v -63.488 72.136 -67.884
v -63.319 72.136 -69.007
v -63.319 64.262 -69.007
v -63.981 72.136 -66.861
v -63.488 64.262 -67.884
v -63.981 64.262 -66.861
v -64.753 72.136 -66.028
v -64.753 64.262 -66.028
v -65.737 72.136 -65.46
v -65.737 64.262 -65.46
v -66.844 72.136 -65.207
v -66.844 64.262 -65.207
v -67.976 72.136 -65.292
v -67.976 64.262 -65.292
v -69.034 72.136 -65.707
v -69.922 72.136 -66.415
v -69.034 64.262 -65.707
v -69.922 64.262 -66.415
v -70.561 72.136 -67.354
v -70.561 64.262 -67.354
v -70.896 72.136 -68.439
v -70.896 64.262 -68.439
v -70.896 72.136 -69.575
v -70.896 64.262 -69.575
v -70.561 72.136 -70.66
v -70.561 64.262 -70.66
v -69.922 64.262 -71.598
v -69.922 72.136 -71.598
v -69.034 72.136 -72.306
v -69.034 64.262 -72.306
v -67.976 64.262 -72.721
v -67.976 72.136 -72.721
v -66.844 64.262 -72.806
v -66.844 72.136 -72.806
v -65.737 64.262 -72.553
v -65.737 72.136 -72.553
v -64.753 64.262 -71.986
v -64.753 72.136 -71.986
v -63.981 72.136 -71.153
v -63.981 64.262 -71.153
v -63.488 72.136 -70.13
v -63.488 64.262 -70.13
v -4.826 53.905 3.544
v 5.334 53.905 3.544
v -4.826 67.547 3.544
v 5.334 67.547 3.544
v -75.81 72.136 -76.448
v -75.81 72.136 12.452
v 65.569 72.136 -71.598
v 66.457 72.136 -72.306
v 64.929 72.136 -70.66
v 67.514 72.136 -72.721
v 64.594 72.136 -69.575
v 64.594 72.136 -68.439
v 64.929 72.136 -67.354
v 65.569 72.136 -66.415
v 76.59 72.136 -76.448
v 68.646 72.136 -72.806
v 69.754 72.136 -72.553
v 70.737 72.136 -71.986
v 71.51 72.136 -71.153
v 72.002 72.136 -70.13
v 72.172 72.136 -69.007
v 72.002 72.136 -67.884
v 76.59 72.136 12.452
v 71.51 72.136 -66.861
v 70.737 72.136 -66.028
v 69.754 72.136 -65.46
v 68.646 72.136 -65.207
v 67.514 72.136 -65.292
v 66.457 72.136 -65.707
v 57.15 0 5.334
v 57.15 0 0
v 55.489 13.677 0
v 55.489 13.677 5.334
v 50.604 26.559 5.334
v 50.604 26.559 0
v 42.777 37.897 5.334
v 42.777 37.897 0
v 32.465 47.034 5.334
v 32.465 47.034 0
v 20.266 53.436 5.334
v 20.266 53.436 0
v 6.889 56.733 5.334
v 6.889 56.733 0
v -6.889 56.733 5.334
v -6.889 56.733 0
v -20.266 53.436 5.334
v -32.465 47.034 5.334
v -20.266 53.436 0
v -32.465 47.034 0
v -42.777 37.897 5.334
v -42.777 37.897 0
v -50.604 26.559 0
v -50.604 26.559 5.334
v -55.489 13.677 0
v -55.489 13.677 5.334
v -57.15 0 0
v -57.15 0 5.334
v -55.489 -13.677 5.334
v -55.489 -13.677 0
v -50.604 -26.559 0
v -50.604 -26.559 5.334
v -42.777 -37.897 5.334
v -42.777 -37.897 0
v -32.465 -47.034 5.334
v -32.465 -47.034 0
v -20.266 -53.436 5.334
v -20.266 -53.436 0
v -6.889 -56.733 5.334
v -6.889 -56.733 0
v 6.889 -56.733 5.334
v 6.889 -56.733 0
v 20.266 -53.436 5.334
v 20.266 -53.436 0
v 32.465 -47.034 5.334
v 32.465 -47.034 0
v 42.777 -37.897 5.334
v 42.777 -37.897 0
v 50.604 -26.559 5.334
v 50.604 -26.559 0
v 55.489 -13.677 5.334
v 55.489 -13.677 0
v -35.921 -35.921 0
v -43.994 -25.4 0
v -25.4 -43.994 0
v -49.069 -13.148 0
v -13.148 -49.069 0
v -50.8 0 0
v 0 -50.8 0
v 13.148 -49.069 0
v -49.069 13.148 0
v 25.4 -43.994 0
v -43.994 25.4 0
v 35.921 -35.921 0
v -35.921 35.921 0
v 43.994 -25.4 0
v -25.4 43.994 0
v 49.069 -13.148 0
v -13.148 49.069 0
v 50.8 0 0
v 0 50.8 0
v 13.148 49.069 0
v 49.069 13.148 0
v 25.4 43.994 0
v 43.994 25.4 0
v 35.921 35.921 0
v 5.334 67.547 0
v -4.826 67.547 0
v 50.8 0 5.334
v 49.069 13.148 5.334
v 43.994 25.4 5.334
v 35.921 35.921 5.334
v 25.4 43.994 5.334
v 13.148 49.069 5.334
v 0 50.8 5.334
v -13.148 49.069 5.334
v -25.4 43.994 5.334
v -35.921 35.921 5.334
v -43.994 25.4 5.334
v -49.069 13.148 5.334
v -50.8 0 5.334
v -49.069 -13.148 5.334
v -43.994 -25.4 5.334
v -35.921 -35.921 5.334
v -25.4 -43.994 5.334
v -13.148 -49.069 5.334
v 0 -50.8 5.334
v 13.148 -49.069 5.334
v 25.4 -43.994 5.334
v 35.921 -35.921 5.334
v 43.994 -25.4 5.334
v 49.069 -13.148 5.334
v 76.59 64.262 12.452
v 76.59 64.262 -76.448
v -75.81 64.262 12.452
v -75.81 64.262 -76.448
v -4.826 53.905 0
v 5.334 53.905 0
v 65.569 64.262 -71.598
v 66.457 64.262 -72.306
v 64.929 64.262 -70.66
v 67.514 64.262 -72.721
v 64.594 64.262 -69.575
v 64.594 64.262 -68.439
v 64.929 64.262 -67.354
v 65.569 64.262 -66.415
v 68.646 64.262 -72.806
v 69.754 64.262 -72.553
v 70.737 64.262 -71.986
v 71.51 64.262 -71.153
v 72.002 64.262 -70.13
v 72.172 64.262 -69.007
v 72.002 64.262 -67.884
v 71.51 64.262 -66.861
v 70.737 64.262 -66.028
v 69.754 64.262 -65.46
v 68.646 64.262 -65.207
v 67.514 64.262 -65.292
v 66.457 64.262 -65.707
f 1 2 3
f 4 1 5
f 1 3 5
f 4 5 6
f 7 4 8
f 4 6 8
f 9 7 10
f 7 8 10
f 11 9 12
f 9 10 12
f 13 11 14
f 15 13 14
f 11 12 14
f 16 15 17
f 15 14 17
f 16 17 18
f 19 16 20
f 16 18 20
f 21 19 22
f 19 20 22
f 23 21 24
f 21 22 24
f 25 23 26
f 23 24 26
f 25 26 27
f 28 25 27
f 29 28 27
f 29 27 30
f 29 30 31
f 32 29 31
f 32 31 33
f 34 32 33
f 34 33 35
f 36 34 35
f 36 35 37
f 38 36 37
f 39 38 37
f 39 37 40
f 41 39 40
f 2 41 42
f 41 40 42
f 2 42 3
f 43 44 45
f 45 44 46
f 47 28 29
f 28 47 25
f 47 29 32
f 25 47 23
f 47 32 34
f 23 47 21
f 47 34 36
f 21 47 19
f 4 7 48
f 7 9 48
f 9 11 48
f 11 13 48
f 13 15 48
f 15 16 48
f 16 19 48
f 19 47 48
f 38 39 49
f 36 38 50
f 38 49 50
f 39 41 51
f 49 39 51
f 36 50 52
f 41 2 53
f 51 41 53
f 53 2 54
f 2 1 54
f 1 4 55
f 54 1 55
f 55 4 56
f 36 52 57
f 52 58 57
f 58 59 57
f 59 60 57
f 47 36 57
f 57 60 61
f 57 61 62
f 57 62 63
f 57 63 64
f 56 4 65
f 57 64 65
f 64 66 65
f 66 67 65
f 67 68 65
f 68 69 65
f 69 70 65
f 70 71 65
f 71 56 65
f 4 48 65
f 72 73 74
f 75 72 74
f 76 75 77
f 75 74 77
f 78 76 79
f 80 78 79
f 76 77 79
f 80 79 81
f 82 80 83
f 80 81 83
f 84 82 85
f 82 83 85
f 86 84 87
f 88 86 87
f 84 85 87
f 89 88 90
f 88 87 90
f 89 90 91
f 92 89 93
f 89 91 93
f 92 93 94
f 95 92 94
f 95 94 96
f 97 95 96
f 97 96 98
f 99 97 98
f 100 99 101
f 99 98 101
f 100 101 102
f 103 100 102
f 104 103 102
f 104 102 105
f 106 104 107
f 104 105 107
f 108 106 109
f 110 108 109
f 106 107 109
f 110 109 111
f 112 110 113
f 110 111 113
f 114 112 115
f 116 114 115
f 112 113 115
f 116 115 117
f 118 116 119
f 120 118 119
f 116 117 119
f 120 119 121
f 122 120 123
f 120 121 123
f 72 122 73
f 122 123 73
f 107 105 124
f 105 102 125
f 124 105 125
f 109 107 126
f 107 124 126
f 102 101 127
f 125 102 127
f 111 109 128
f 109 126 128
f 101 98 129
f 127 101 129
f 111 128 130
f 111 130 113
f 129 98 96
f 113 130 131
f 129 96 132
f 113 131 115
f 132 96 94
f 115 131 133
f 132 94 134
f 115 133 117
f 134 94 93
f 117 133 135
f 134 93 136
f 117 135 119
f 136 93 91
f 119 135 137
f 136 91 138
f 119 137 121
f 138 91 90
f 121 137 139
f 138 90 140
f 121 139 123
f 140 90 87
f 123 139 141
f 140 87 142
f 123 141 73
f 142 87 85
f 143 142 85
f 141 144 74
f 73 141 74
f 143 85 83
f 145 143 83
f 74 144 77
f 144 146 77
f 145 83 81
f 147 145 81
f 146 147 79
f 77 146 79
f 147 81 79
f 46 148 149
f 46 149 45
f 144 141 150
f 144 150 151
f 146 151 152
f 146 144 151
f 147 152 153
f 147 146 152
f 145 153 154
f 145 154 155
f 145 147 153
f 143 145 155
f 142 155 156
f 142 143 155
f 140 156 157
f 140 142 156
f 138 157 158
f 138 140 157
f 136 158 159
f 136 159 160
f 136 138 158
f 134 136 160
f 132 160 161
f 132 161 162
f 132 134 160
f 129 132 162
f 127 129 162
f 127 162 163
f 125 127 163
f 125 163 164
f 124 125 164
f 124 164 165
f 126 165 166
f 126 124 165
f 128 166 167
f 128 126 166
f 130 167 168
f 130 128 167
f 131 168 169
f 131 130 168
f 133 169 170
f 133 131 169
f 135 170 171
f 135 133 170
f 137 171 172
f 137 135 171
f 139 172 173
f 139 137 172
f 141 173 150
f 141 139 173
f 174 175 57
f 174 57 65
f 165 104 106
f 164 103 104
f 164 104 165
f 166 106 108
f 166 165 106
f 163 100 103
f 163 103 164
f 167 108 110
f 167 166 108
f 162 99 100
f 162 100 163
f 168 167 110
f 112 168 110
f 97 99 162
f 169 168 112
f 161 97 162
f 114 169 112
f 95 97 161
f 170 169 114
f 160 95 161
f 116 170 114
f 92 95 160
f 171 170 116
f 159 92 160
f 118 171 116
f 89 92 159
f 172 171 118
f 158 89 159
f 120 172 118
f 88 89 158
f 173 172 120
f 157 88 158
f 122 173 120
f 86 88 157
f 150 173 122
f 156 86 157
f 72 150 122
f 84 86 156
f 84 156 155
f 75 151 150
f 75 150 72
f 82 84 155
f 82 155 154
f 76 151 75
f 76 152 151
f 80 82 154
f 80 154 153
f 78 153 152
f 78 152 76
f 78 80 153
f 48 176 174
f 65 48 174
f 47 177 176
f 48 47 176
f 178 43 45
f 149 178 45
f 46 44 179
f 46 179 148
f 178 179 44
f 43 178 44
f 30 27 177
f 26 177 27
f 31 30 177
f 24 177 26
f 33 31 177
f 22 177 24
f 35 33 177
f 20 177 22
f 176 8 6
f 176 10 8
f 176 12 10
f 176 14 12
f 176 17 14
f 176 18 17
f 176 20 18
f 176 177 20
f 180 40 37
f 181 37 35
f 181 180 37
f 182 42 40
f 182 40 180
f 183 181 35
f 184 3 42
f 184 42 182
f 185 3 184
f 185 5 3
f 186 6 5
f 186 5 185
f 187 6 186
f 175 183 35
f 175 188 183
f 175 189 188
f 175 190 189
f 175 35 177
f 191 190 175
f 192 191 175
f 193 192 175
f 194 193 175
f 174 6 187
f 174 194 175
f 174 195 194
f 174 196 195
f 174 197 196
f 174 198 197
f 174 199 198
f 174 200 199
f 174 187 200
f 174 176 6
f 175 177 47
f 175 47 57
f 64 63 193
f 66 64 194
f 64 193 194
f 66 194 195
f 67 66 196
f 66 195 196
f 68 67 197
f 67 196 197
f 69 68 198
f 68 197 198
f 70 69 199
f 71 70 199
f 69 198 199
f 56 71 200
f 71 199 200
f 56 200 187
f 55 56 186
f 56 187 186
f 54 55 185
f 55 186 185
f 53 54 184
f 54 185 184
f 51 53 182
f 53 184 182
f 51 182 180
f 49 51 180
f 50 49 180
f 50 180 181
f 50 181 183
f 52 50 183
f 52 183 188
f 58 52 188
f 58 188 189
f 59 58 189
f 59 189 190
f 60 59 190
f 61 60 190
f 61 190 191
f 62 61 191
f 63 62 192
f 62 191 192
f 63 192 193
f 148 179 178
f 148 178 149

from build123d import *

# Parameters (mm, degrees)
F0_R          = 57.15
F0_R_2        = 50.8
F1_DEPTH      = 5.334
F3_START      = -64.262
F2_W          = 152.4
F2_H          = 88.9
F2_R          = 3.81
F3_DEPTH      = 7.874
F4_W          = 13.6420466006
F4_H          = 3.5441415384
F5_DEPTH      = 5.334
F5_DEPTH_BACK = 4.826


with BuildPart() as f1:
    # F0 (on Top) → F1 (new body)
    with BuildSketch(Plane.XY):
        Circle(F0_R)
        Circle(F0_R_2, mode=Mode.SUBTRACT)
    extrude(amount=F1_DEPTH)


with BuildPart() as f3:
    # F2 (on Front) → F3 (new body)
    with BuildSketch(Plane.XZ.offset(F3_START)):
        with Locations((0.3900220513, -31.9978966594)):
            Rectangle(F2_W, F2_H)
        with Locations((-67.1286657453, -69.0067708492)):
            Circle(F2_R, mode=Mode.SUBTRACT)
        with Locations((68.3617144823, -69.0067708492)):
            Circle(F2_R, mode=Mode.SUBTRACT)
    extrude(amount=-F3_DEPTH)


with BuildPart() as f5:
    # F4 (on Right) → F5 (new body, two sides)
    with BuildSketch(Plane.YZ) as f5_sk:
        with Locations((60.7255827636, 1.7720707692)):
            Rectangle(F4_W, F4_H)
    extrude(amount=F5_DEPTH)
    extrude(f5_sk.sketch, amount=-F5_DEPTH_BACK)


solid = Compound([f1.part, f3.part, f5.part])
